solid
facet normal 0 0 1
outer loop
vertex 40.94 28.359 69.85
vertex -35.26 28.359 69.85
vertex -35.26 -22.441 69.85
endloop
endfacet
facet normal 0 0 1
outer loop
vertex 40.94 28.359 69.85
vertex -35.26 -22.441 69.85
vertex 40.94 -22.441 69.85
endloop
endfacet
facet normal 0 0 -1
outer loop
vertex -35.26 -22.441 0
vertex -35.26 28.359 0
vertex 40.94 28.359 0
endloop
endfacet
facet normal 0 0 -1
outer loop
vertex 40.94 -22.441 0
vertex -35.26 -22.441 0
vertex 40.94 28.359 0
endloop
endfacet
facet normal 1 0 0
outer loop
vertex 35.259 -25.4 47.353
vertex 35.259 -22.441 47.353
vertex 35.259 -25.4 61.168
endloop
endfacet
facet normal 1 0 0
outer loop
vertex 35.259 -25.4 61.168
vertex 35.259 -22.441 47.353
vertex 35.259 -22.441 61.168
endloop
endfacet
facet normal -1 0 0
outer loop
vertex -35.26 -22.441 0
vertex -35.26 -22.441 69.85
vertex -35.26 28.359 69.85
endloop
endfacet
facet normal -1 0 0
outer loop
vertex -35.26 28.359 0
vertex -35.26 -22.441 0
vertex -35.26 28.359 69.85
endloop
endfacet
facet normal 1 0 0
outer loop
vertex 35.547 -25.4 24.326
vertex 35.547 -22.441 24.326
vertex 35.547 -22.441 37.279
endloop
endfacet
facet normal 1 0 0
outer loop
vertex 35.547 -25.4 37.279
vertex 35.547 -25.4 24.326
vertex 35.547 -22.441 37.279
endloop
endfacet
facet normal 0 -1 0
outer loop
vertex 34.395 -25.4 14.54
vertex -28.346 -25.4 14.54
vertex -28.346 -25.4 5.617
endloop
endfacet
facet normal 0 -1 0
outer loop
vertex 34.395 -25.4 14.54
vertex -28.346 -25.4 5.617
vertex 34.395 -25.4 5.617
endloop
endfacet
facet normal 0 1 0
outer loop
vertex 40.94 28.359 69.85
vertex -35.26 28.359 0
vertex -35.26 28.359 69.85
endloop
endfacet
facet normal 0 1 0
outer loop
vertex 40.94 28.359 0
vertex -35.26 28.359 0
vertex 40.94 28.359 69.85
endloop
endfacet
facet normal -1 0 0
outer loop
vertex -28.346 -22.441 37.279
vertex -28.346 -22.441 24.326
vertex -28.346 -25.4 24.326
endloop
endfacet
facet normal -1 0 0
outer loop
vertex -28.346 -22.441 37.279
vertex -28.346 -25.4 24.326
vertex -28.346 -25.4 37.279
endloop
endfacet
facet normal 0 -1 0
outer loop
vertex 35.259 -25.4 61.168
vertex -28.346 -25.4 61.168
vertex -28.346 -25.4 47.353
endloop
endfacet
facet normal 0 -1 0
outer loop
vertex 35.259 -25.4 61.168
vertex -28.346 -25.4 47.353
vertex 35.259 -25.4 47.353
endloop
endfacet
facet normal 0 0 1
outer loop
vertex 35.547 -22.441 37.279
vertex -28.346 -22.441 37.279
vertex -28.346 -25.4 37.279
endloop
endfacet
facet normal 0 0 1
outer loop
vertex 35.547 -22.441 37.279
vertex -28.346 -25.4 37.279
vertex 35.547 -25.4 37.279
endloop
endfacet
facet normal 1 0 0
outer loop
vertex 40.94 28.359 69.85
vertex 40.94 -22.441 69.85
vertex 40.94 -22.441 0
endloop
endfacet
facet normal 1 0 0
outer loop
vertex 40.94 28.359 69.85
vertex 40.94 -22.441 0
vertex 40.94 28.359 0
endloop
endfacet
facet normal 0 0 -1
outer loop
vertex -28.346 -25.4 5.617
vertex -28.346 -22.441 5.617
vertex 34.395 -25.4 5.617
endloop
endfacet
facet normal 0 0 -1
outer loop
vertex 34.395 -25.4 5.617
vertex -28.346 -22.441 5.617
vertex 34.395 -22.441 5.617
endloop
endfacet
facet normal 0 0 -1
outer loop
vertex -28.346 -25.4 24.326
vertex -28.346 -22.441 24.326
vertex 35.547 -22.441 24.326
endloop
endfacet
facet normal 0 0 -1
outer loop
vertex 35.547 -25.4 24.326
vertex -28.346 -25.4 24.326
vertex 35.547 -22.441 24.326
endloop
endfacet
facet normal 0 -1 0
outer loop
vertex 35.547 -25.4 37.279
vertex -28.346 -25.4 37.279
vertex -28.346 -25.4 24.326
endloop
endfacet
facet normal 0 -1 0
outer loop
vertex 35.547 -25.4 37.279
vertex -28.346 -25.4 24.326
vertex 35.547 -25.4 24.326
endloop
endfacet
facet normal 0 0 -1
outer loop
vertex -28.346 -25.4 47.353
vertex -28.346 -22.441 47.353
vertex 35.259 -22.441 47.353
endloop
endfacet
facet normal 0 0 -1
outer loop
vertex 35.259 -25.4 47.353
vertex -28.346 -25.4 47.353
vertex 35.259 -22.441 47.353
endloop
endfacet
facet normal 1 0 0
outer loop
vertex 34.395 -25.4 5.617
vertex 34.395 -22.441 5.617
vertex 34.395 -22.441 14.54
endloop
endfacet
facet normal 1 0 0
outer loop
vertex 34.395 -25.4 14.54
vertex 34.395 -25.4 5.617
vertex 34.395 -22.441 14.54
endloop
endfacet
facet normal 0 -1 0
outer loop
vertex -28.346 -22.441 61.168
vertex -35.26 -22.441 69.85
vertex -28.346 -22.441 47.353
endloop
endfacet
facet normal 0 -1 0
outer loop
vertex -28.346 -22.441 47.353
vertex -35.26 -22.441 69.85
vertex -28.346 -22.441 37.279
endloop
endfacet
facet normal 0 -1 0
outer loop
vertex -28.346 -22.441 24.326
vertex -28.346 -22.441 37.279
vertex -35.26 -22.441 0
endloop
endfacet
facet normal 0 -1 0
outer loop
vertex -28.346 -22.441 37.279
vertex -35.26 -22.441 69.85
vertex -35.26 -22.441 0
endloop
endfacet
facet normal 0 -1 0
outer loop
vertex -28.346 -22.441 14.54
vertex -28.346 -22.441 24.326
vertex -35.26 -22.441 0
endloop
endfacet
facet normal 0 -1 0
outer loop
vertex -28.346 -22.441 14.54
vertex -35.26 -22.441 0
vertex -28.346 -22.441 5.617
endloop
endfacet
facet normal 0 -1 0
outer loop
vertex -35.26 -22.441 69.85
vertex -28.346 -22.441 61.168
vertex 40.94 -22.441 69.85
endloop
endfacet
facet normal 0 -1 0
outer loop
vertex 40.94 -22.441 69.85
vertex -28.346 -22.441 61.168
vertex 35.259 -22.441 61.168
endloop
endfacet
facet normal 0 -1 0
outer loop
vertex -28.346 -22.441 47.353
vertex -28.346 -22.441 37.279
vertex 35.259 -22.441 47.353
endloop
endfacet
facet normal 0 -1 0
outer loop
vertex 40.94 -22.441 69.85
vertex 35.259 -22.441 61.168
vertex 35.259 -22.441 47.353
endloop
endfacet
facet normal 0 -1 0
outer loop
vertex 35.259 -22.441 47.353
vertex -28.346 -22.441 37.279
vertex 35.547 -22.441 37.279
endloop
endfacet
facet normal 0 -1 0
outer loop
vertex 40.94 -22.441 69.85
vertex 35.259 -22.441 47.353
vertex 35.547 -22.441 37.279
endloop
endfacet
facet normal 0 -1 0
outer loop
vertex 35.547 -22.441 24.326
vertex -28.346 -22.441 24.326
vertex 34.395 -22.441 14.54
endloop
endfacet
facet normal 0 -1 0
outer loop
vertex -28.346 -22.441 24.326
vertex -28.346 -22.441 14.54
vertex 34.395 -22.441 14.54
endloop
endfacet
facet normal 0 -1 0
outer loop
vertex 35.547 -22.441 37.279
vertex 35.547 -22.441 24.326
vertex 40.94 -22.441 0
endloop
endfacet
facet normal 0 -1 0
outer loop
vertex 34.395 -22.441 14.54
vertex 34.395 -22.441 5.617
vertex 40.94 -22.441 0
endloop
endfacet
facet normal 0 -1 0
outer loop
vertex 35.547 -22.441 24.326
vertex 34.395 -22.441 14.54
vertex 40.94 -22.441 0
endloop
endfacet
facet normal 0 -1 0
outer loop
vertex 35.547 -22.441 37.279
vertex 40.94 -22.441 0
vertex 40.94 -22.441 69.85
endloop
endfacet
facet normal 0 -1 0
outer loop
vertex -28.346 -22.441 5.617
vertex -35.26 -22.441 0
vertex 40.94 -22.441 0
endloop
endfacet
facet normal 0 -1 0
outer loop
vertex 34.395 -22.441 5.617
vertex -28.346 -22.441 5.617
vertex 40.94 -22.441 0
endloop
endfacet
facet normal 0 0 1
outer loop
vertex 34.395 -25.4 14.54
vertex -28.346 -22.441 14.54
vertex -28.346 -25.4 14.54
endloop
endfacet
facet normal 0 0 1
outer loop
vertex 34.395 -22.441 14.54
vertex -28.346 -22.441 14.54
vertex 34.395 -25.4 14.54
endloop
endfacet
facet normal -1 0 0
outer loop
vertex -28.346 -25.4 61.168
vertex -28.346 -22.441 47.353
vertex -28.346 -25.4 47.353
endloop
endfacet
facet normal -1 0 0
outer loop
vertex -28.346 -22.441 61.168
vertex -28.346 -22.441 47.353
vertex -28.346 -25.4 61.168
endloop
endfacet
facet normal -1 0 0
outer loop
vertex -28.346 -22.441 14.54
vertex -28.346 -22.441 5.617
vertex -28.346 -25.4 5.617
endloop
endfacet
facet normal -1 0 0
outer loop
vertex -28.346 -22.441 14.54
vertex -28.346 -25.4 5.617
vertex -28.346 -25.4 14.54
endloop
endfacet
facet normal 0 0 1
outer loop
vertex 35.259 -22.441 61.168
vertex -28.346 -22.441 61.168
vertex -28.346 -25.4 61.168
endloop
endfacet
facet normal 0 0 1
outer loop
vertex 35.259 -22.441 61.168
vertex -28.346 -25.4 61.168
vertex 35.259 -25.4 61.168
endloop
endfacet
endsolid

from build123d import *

# Parameters (mm, degrees)
F0_W     = 76.2
F0_H     = 50.8
F1_DEPTH = 69.85
F2_W     = 63.605074
F2_H     = 13.815801
F2_W_2   = 63.892879
F2_H_2   = 12.952317
F2_W_3   = 62.741656
F2_H_3   = 8.922708
F3_DEPTH = 25.4


with BuildPart() as f1:
    # F0 (on Top) → F1 (new body)
    with BuildSketch(Plane.XY):
        with Locations((2.839793, 2.958526)):
            Rectangle(F0_W, F0_H)
    extrude(amount=F1_DEPTH)

    # F2 (on Front) → F3 (join)
    with BuildSketch(Plane.XZ):
        with Locations((3.456326, 54.260583)):
            Rectangle(F2_W, F2_H)
        with Locations((3.600228, 30.802497)):
            Rectangle(F2_W_2, F2_H_2)
        with Locations((3.024617, 10.078791)):
            Rectangle(F2_W_3, F2_H_3)
    extrude(amount=F3_DEPTH)


solid = f1.part
